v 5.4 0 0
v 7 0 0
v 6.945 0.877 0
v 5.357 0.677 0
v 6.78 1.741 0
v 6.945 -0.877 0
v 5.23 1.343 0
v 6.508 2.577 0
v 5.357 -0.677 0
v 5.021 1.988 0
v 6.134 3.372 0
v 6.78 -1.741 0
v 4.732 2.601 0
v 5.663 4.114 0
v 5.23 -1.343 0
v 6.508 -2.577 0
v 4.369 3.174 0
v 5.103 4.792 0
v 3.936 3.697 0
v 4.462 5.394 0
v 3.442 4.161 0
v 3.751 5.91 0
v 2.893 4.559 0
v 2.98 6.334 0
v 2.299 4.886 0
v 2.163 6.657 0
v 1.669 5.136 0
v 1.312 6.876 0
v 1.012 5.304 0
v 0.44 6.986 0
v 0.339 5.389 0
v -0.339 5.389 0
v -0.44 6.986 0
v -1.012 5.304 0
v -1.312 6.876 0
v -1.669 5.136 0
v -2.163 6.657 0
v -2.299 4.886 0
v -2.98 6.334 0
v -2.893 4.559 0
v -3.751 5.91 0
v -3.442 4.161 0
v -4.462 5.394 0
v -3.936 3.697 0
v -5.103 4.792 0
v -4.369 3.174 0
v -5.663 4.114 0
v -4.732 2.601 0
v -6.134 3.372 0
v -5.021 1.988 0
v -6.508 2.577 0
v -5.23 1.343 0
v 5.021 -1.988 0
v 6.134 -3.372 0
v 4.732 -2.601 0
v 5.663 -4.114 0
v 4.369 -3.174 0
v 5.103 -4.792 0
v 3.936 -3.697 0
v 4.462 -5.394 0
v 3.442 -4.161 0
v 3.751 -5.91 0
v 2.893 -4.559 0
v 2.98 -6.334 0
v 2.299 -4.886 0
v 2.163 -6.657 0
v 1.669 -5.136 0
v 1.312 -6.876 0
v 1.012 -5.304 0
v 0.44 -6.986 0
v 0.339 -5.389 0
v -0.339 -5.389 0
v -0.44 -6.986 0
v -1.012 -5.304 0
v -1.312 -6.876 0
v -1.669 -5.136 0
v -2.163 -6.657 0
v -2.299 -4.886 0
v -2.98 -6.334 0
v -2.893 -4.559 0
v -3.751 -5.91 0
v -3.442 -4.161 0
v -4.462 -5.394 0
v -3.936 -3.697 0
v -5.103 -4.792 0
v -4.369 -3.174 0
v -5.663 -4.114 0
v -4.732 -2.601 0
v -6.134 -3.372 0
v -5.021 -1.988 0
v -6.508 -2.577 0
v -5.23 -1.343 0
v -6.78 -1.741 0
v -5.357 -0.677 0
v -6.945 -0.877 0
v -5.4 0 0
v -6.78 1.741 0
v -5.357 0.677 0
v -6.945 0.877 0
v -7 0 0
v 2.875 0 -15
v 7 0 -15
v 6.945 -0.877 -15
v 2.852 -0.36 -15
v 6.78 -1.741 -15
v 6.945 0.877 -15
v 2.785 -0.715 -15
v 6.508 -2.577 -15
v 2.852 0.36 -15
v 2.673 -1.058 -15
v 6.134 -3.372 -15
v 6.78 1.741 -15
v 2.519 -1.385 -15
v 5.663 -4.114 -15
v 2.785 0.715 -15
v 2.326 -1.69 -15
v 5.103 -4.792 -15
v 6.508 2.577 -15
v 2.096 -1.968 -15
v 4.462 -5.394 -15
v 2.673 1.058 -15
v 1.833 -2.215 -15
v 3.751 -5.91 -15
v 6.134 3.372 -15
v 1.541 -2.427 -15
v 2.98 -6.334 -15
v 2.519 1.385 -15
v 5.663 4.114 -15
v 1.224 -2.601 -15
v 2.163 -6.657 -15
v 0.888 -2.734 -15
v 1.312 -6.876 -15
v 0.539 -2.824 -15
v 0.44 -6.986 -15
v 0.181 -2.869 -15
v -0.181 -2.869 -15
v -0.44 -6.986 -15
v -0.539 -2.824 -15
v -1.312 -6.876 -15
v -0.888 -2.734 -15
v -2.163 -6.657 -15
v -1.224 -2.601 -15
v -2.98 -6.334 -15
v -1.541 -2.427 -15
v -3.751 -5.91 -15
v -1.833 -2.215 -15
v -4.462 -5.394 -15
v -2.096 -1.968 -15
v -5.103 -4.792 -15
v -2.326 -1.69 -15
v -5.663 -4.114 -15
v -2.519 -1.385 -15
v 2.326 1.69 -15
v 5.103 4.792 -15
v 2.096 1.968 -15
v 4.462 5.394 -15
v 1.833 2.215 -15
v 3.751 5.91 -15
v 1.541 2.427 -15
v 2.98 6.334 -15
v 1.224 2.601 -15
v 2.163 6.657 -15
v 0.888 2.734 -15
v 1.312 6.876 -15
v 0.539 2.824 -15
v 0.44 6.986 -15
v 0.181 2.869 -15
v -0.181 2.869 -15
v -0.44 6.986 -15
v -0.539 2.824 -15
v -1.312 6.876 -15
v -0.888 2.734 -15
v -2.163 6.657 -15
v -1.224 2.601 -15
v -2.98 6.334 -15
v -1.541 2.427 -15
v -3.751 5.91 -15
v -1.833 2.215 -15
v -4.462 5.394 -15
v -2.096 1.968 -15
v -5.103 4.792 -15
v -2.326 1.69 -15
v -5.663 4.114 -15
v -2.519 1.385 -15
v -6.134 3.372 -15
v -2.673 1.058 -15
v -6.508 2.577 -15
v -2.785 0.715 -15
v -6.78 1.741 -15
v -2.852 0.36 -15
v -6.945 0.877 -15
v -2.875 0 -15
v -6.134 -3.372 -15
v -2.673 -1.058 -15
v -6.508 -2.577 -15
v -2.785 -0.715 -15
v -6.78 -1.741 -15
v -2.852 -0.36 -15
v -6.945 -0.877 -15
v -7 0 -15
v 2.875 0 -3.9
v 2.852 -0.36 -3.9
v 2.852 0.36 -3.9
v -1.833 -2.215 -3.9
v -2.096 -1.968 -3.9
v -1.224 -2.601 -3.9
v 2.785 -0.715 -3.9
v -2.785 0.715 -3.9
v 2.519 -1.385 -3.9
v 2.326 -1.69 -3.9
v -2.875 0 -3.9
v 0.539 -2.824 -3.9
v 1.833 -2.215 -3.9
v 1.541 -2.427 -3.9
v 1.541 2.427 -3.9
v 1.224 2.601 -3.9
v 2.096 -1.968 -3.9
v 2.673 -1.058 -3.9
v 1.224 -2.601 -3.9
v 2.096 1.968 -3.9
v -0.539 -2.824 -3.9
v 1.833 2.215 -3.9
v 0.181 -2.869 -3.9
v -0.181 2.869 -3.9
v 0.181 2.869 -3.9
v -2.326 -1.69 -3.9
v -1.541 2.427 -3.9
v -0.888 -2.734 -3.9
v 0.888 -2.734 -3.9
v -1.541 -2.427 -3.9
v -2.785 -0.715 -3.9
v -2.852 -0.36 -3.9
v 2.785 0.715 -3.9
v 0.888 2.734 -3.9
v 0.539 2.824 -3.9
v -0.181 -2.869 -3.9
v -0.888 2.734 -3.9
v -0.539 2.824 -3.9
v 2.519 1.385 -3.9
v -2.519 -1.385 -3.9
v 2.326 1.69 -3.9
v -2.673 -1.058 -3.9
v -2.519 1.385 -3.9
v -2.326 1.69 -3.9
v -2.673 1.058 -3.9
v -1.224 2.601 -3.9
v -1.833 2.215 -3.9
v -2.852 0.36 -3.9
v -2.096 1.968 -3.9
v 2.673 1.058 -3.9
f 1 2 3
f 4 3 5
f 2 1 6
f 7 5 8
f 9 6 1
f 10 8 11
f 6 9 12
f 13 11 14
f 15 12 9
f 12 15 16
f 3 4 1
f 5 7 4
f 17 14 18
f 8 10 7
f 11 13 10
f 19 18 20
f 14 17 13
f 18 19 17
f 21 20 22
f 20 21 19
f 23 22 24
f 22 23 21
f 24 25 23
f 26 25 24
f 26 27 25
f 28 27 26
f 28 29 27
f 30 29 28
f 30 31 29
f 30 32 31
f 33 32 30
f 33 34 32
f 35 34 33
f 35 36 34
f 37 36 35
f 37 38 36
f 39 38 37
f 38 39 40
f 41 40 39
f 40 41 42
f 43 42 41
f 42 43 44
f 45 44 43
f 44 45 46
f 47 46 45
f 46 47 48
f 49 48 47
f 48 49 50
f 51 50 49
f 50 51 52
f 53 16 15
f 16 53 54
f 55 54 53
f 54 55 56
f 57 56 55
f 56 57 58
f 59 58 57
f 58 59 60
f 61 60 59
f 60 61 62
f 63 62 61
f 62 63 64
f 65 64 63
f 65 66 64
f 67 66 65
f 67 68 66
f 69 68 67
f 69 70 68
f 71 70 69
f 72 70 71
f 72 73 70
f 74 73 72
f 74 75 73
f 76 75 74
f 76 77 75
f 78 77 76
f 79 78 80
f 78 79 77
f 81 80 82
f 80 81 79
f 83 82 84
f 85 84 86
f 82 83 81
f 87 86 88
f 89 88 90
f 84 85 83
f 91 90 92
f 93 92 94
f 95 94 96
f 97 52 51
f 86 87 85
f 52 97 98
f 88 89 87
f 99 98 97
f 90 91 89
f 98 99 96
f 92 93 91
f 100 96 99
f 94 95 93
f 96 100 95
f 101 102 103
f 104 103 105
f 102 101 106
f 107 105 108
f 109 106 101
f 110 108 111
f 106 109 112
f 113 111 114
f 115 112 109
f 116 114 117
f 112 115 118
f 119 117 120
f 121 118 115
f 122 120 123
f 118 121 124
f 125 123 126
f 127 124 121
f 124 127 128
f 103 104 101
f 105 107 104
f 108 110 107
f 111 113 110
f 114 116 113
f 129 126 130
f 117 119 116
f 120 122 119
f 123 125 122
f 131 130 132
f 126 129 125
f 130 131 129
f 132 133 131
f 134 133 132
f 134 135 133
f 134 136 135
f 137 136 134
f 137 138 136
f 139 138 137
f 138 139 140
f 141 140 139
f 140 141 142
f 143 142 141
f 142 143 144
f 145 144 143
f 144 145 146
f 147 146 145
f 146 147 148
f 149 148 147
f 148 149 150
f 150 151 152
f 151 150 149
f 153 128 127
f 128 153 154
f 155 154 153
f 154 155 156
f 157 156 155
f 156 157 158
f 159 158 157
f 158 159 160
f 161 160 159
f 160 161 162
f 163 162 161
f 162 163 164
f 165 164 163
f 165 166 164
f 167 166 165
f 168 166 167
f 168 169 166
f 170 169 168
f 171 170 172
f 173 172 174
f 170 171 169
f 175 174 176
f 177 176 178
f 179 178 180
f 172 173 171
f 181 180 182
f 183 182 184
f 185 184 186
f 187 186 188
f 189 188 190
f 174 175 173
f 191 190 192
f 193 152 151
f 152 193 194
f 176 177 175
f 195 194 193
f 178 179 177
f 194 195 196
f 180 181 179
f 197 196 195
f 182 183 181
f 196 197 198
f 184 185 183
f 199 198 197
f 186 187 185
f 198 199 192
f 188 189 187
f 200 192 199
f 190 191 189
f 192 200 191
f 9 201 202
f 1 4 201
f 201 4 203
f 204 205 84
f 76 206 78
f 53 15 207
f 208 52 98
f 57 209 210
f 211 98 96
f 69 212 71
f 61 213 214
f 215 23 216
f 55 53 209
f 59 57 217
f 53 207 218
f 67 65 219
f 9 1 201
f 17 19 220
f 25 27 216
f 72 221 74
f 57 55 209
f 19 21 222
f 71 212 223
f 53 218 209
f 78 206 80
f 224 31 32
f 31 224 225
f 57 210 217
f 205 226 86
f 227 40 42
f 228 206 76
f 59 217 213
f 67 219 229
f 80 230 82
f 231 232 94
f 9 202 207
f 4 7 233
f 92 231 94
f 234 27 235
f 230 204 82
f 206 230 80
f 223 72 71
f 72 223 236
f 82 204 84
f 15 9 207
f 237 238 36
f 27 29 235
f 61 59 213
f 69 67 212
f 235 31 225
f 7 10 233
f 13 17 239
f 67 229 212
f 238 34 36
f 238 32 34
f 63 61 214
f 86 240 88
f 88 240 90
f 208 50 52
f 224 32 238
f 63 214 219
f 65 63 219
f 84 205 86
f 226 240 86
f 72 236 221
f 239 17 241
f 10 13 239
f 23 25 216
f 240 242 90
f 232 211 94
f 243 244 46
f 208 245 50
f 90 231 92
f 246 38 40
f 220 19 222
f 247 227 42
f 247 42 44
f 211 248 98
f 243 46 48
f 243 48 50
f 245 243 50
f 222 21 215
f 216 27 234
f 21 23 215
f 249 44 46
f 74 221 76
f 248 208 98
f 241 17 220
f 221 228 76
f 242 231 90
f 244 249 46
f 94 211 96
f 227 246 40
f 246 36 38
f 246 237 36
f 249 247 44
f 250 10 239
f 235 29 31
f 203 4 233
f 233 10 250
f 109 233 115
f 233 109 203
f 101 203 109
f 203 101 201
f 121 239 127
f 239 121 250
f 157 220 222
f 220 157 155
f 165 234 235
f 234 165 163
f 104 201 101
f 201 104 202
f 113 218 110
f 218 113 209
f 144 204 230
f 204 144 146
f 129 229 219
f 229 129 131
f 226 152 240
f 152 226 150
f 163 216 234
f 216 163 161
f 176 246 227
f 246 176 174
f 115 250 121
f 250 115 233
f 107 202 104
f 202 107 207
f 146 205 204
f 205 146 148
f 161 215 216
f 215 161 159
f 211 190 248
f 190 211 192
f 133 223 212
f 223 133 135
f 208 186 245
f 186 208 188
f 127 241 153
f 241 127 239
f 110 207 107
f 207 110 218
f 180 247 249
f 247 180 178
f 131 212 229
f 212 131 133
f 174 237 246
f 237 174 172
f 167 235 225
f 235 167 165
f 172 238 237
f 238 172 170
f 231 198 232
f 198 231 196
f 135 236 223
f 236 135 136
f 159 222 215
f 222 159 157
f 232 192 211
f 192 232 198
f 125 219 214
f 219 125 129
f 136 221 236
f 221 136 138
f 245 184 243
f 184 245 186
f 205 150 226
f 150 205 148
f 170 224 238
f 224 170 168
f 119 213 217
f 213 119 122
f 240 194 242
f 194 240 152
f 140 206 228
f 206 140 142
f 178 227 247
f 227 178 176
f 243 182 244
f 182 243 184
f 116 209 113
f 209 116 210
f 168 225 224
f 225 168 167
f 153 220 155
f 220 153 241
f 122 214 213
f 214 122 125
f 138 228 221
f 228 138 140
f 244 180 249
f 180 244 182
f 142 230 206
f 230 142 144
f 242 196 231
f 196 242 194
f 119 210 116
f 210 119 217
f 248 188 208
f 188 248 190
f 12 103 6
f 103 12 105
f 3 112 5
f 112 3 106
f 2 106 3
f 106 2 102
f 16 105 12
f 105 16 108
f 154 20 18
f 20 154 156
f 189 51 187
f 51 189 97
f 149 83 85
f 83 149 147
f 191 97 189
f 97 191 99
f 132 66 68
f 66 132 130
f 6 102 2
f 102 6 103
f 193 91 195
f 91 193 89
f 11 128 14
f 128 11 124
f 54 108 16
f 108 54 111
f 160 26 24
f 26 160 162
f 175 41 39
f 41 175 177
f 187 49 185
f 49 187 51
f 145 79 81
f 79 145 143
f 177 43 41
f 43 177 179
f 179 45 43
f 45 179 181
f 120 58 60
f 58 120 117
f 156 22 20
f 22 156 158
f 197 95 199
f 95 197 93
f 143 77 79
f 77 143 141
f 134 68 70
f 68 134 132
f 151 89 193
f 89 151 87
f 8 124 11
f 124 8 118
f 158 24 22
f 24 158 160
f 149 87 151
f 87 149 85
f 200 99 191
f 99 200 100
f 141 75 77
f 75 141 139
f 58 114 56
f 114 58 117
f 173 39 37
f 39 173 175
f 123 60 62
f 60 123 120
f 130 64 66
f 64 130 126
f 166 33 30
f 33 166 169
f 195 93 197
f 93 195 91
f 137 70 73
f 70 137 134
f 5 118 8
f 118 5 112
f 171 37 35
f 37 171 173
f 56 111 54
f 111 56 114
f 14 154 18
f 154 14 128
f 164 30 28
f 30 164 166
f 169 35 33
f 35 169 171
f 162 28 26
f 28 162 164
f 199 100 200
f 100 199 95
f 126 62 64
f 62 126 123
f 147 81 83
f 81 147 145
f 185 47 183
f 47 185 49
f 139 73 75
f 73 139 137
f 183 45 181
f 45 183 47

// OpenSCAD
$fn = 50;


difference() {
	union() {
		translate(v = [0, 0, -15.0000000000]) {
			cylinder(h = 15, r = 7.0000000000);
		}
		cylinder(h = 0, r = 16.0000000000);
	}
	union() {
		translate(v = [0, 0, 0]) {
			rotate(a = [0, 0, 0]) {
				difference() {
					union() {
						#translate(v = [0, 0, -15.0000000000]) {
							cylinder(h = 15, r = 2.6000000000);
						}
						#translate(v = [0, 0, -3.9000000000]) {
							cylinder(h = 3.9000000000, r = 7.0000000000, r1 = 2.8750000000, r2 = 5.4000000000);
						}
						#translate(v = [0, 0, -15.0000000000]) {
							cylinder(h = 15, r = 2.8750000000);
						}
						#translate(v = [0, 0, -15.0000000000]) {
							cylinder(h = 15, r = 2.6000000000);
						}
					}
					union();
				}
			}
		}
	}
}
